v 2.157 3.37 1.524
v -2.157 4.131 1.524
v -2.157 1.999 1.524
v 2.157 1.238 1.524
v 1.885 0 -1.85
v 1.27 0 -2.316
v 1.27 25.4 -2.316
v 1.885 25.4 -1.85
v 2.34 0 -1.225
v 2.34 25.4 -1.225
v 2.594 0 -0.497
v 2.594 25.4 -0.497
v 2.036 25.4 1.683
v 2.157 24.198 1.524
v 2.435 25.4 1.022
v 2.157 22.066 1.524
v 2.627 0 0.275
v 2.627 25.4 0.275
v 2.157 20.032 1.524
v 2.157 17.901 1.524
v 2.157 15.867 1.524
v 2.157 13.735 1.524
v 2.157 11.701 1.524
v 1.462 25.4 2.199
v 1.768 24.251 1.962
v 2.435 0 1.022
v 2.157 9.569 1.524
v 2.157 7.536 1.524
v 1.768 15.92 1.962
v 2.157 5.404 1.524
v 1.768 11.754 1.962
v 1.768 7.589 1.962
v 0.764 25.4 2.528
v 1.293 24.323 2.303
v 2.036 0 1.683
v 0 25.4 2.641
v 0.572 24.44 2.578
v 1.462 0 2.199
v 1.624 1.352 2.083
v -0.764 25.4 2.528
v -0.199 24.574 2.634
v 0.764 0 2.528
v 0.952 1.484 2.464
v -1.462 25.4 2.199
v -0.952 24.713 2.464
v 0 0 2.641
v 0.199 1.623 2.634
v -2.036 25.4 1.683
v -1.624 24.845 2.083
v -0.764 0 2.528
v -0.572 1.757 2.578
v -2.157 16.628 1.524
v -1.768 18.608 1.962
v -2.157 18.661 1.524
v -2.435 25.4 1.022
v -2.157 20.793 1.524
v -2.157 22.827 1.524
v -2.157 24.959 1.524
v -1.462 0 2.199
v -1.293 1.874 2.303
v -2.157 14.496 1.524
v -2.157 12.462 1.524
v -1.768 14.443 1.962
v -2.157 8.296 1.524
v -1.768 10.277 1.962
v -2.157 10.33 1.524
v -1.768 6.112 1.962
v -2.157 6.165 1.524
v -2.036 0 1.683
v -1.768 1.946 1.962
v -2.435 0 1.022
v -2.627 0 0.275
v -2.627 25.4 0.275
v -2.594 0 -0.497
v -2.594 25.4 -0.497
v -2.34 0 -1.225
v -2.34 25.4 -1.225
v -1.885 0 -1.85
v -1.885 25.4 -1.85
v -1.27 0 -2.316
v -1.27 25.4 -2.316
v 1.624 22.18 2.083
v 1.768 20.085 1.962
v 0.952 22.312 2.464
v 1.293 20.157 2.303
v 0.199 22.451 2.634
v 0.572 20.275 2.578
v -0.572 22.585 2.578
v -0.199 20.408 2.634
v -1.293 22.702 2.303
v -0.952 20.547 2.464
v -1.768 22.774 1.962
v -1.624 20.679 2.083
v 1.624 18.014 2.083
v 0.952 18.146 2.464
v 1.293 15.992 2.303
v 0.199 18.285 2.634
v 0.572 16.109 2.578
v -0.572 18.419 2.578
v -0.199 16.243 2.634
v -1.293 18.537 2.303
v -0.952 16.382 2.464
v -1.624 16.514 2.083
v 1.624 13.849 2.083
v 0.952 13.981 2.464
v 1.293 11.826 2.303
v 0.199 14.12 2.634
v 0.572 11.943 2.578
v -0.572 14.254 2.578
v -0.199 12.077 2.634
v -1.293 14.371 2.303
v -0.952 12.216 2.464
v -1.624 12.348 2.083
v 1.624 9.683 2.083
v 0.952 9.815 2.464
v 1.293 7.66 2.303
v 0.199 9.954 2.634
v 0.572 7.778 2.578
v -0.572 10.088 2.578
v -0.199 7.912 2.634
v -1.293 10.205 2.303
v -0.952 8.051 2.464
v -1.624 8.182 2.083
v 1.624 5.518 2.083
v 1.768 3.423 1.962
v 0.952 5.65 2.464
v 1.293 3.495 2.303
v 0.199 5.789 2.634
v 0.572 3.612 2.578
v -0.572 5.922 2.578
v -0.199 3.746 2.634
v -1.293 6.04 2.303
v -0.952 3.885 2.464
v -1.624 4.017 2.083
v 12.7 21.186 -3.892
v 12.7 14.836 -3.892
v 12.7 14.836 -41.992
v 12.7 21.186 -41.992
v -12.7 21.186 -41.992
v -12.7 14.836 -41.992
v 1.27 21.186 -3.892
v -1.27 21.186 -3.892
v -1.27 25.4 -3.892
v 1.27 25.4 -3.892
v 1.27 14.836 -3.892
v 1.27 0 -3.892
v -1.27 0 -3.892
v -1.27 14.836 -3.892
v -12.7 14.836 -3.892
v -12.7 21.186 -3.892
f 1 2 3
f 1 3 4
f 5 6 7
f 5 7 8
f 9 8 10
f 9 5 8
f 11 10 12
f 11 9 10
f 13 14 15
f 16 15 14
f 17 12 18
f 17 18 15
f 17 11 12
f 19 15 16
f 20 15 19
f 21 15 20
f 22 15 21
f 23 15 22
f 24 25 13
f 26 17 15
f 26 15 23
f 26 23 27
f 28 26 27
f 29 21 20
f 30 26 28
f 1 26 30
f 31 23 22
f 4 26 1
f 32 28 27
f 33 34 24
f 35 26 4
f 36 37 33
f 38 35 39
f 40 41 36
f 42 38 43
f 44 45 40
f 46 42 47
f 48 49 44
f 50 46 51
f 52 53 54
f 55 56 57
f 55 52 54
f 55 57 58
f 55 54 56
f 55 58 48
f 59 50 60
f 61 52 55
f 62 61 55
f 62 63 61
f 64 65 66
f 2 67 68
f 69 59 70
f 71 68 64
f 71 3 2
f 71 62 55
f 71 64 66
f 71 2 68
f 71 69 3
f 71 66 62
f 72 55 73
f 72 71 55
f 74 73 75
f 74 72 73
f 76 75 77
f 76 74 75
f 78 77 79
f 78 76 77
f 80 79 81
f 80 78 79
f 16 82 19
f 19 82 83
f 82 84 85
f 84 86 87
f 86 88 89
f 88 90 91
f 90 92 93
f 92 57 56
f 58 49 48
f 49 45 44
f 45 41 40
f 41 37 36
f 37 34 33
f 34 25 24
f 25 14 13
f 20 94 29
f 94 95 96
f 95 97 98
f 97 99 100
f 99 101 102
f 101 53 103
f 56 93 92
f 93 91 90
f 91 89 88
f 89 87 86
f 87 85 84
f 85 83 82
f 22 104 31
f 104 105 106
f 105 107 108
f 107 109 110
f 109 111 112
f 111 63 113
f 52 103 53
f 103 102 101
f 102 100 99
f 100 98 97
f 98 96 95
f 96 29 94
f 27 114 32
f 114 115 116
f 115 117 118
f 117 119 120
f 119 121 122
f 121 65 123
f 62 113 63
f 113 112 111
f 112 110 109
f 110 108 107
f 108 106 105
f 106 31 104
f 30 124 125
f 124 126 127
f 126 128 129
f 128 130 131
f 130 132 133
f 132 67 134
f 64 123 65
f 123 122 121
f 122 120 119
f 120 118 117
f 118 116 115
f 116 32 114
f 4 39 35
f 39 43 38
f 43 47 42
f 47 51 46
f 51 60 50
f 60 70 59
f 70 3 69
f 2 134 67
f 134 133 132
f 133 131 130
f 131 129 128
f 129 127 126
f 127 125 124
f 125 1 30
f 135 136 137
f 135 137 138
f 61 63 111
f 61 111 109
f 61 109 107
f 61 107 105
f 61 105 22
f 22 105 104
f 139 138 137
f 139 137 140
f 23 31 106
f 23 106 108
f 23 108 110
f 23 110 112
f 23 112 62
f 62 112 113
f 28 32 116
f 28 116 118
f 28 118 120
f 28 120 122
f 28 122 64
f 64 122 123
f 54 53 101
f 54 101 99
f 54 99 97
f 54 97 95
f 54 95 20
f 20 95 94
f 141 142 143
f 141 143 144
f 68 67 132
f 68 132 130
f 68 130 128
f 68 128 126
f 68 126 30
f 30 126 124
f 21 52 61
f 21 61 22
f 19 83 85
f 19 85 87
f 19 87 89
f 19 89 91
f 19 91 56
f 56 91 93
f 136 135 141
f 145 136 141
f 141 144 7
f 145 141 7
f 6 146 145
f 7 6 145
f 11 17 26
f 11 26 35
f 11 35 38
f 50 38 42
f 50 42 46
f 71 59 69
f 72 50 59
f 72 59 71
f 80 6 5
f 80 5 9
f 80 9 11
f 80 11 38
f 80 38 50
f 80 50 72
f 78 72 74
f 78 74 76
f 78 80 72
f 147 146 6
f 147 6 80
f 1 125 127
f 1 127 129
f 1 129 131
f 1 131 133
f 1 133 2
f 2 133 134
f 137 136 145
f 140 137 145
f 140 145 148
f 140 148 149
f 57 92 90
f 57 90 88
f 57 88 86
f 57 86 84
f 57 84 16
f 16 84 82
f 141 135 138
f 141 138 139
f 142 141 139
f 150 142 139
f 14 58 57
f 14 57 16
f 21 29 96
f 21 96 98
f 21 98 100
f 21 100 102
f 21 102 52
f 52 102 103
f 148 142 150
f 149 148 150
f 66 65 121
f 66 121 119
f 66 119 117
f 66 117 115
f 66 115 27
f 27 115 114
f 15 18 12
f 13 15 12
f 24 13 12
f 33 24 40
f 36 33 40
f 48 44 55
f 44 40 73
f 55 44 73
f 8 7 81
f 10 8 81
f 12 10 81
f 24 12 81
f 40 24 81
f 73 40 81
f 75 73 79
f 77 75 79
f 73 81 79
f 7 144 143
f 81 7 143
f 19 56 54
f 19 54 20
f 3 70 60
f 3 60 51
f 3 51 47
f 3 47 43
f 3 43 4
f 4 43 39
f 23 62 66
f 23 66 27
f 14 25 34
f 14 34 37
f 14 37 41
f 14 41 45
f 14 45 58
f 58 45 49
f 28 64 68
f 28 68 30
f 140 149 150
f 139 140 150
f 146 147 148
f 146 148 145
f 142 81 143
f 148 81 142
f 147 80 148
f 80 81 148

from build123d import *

# Parameters (mm, degrees)
BOSS_EXTRUDE1_DEPTH          = 25.4
SKETCH3_W                    = 25.4
SKETCH3_H                    = 6.35
BOSS_EXTRUDE3_DEPTH          = 38.1
CUT_EXTRUDE1_START           = 5.08
CUT_EXTRUDE1_DEPTH           = 3.556
CUT_EXTRUDE1_DRAFT           = 2
CUT_EXTRUDE1_PROFILE_2_DEPTH = 3.556
CUT_EXTRUDE1_PROFILE_2_DRAFT = 2
CUT_EXTRUDE1_PROFILE_3_DEPTH = 3.556
CUT_EXTRUDE1_PROFILE_3_DRAFT = 2
CUT_EXTRUDE1_PROFILE_4_DEPTH = 3.556
CUT_EXTRUDE1_PROFILE_4_DRAFT = 2
CUT_EXTRUDE1_PROFILE_5_DEPTH = 3.556
CUT_EXTRUDE1_PROFILE_5_DRAFT = 2
CUT_EXTRUDE1_PROFILE_6_DEPTH = 3.556
CUT_EXTRUDE1_PROFILE_6_DRAFT = 2


with BuildPart() as part:
    # Sketch1 → Boss-Extrude1 (new body)
    with BuildSketch(Plane(origin=(0, 0, 0), x_dir=(1, 0, 0), z_dir=(0, 1, 0))):
        with BuildLine():
            Line((-1.27, 3.89197217), (1.27, 3.89197217))
            Line((1.27, 3.89197217), (1.27, 2.315656298))
            ThreePointArc((1.27, 2.315656298), (0, -2.641053595), (-1.27, 2.315656298))
            Line((-1.27, 2.315656298), (-1.27, 3.89197217))
        make_face()
    extrude(amount=BOSS_EXTRUDE1_DEPTH)

    # Sketch3 → Boss-Extrude3 (add)
    with BuildSketch(Plane(origin=(0, 0, -3.89197217), x_dir=(-1, 0, 0), z_dir=(0, 0, -1))):
        with Locations((0, 18.011112495)):
            Rectangle(SKETCH3_W, SKETCH3_H)
    extrude(amount=BOSS_EXTRUDE3_DEPTH)


with BuildPart() as cut_extrude1_tool:
    # Sketch4 → Cut-Extrude1 (with draft: the straight prism first)
    with BuildSketch(Plane.XY.offset(CUT_EXTRUDE1_START)):
        Polygon((-3.113495219, 25.001271063), (-3.113495219, 23.121671063), (2.876409327, 22.06548928), (2.876409327, 23.94508928), align=None)
    extrude(amount=-CUT_EXTRUDE1_DEPTH)
    # Cut-Extrude1: the draft: its side faces are tilted about the plane it starts from
    cut_extrude1_sides = [cut_extrude1_tool.faces().sort_by_distance(p)[0] for p in [
        (-3.113495219, 24.061471063, 3.302),
        (-0.118542946, 22.593580171, 3.302),
        (2.876409327, 23.00528928, 3.302),
        (-0.118542946, 24.473180171, 3.302),
    ]]
    draft(cut_extrude1_sides, Plane.XY.offset(CUT_EXTRUDE1_START), CUT_EXTRUDE1_DRAFT)


with BuildPart() as part_1:
    add(part.part)

    # Cut-Extrude1: cut by cut_extrude1_tool
    add(cut_extrude1_tool.part, mode=Mode.SUBTRACT)


with BuildPart() as cut_extrude1_profile_2_tool:
    # Sketch4 → Cut-Extrude1 profile 2 (with draft: the straight prism first)
    with BuildSketch(Plane.XY.offset(CUT_EXTRUDE1_START)):
        Polygon((-3.113495219, 16.670071063), (-3.113495219, 14.790471063), (2.876409327, 13.73428928), (2.876409327, 15.61388928), align=None)
    extrude(amount=-CUT_EXTRUDE1_PROFILE_2_DEPTH)
    # Cut-Extrude1 profile 2: the draft: its side faces are tilted about the plane it starts from
    cut_extrude1_profile_2_sides = [cut_extrude1_profile_2_tool.faces().sort_by_distance(p)[0] for p in [
        (-3.113495219, 15.730271063, 3.302),
        (-0.118542946, 14.262380171, 3.302),
        (2.876409327, 14.67408928, 3.302),
        (-0.118542946, 16.141980171, 3.302),
    ]]
    draft(cut_extrude1_profile_2_sides, Plane.XY.offset(CUT_EXTRUDE1_START), CUT_EXTRUDE1_PROFILE_2_DRAFT)


with BuildPart() as part_2:
    add(part_1.part)

    # Cut-Extrude1 profile 2: cut by cut_extrude1_profile_2_tool
    add(cut_extrude1_profile_2_tool.part, mode=Mode.SUBTRACT)


with BuildPart() as cut_extrude1_profile_3_tool:
    # Sketch4 → Cut-Extrude1 profile 3 (with draft: the straight prism first)
    with BuildSketch(Plane.XY.offset(CUT_EXTRUDE1_START)):
        Polygon((-3.113495219, 20.835671063), (-3.113495219, 18.956071063), (2.876409327, 17.89988928), (2.876409327, 19.77948928), align=None)
    extrude(amount=-CUT_EXTRUDE1_PROFILE_3_DEPTH)
    # Cut-Extrude1 profile 3: the draft: its side faces are tilted about the plane it starts from
    cut_extrude1_profile_3_sides = [cut_extrude1_profile_3_tool.faces().sort_by_distance(p)[0] for p in [
        (-3.113495219, 19.895871063, 3.302),
        (-0.118542946, 18.427980171, 3.302),
        (2.876409327, 18.83968928, 3.302),
        (-0.118542946, 20.307580171, 3.302),
    ]]
    draft(cut_extrude1_profile_3_sides, Plane.XY.offset(CUT_EXTRUDE1_START), CUT_EXTRUDE1_PROFILE_3_DRAFT)


with BuildPart() as part_3:
    add(part_2.part)

    # Cut-Extrude1 profile 3: cut by cut_extrude1_profile_3_tool
    add(cut_extrude1_profile_3_tool.part, mode=Mode.SUBTRACT)


with BuildPart() as cut_extrude1_profile_4_tool:
    # Sketch4 → Cut-Extrude1 profile 4 (with draft: the straight prism first)
    with BuildSketch(Plane.XY.offset(CUT_EXTRUDE1_START)):
        Polygon((-3.113495219, 12.504471063), (-3.113495219, 10.624871063), (2.876409327, 9.56868928), (2.876409327, 11.44828928), align=None)
    extrude(amount=-CUT_EXTRUDE1_PROFILE_4_DEPTH)
    # Cut-Extrude1 profile 4: the draft: its side faces are tilted about the plane it starts from
    cut_extrude1_profile_4_sides = [cut_extrude1_profile_4_tool.faces().sort_by_distance(p)[0] for p in [
        (-3.113495219, 11.564671063, 3.302),
        (-0.118542946, 10.096780171, 3.302),
        (2.876409327, 10.50848928, 3.302),
        (-0.118542946, 11.976380171, 3.302),
    ]]
    draft(cut_extrude1_profile_4_sides, Plane.XY.offset(CUT_EXTRUDE1_START), CUT_EXTRUDE1_PROFILE_4_DRAFT)


with BuildPart() as part_4:
    add(part_3.part)

    # Cut-Extrude1 profile 4: cut by cut_extrude1_profile_4_tool
    add(cut_extrude1_profile_4_tool.part, mode=Mode.SUBTRACT)


with BuildPart() as cut_extrude1_profile_5_tool:
    # Sketch4 → Cut-Extrude1 profile 5 (with draft: the straight prism first)
    with BuildSketch(Plane.XY.offset(CUT_EXTRUDE1_START)):
        Polygon((-3.113495219, 8.338871063), (-3.113495219, 6.459271063), (2.876409327, 5.40308928), (2.876409327, 7.28268928), align=None)
    extrude(amount=-CUT_EXTRUDE1_PROFILE_5_DEPTH)
    # Cut-Extrude1 profile 5: the draft: its side faces are tilted about the plane it starts from
    cut_extrude1_profile_5_sides = [cut_extrude1_profile_5_tool.faces().sort_by_distance(p)[0] for p in [
        (-3.113495219, 7.399071063, 3.302),
        (-0.118542946, 5.931180171, 3.302),
        (2.876409327, 6.34288928, 3.302),
        (-0.118542946, 7.810780171, 3.302),
    ]]
    draft(cut_extrude1_profile_5_sides, Plane.XY.offset(CUT_EXTRUDE1_START), CUT_EXTRUDE1_PROFILE_5_DRAFT)


with BuildPart() as part_5:
    add(part_4.part)

    # Cut-Extrude1 profile 5: cut by cut_extrude1_profile_5_tool
    add(cut_extrude1_profile_5_tool.part, mode=Mode.SUBTRACT)


with BuildPart() as cut_extrude1_profile_6_tool:
    # Sketch4 → Cut-Extrude1 profile 6 (with draft: the straight prism first)
    with BuildSketch(Plane.XY.offset(CUT_EXTRUDE1_START)):
        Polygon((-3.113495219, 4.173271063), (-3.113495219, 2.293671063), (2.876409327, 1.23748928), (2.876409327, 3.11708928), align=None)
    extrude(amount=-CUT_EXTRUDE1_PROFILE_6_DEPTH)
    # Cut-Extrude1 profile 6: the draft: its side faces are tilted about the plane it starts from
    cut_extrude1_profile_6_sides = [cut_extrude1_profile_6_tool.faces().sort_by_distance(p)[0] for p in [
        (-3.113495219, 3.233471063, 3.302),
        (-0.118542946, 1.765580171, 3.302),
        (2.876409327, 2.17728928, 3.302),
        (-0.118542946, 3.645180171, 3.302),
    ]]
    draft(cut_extrude1_profile_6_sides, Plane.XY.offset(CUT_EXTRUDE1_START), CUT_EXTRUDE1_PROFILE_6_DRAFT)


with BuildPart() as part_6:
    add(part_5.part)

    # Cut-Extrude1 profile 6: cut by cut_extrude1_profile_6_tool
    add(cut_extrude1_profile_6_tool.part, mode=Mode.SUBTRACT)


solid = part_6.part
